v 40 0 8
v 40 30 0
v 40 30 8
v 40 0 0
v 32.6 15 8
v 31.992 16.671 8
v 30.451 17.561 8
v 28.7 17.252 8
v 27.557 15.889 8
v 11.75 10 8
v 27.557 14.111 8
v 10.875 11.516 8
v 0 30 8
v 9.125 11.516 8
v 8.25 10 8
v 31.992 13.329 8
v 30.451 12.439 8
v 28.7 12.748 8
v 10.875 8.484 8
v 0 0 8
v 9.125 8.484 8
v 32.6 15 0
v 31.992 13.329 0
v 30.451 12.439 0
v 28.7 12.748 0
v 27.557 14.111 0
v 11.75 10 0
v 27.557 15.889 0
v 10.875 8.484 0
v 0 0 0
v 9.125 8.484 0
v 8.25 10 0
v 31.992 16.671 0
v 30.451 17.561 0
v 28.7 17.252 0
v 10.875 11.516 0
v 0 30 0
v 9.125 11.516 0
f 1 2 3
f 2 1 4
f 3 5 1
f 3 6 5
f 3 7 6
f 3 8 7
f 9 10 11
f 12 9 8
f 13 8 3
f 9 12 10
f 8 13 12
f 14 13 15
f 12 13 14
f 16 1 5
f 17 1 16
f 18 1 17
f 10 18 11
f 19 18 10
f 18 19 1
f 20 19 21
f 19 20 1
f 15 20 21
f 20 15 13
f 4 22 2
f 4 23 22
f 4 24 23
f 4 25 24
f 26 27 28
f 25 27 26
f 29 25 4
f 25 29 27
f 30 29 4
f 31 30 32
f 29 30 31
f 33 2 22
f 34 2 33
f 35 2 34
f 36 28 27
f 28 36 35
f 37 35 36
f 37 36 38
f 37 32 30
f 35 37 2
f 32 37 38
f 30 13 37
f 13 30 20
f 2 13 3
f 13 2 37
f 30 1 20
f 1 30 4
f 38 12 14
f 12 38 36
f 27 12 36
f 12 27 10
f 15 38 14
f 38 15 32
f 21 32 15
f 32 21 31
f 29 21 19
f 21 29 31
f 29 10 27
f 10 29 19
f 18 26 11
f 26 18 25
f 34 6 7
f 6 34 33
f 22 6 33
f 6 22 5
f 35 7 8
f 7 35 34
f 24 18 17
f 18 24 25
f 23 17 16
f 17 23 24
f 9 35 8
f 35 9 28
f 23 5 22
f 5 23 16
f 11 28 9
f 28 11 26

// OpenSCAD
difference() {
  cube([40, 30, 8]);
  // M3 heat-set
  translate([10, 10, 0]) cylinder(h=8, d=3.5);
  // M4
  translate([30, 15, 0]) cylinder(h=8, r=2.6);
}
// extrude-wall side 2.0 1.0
